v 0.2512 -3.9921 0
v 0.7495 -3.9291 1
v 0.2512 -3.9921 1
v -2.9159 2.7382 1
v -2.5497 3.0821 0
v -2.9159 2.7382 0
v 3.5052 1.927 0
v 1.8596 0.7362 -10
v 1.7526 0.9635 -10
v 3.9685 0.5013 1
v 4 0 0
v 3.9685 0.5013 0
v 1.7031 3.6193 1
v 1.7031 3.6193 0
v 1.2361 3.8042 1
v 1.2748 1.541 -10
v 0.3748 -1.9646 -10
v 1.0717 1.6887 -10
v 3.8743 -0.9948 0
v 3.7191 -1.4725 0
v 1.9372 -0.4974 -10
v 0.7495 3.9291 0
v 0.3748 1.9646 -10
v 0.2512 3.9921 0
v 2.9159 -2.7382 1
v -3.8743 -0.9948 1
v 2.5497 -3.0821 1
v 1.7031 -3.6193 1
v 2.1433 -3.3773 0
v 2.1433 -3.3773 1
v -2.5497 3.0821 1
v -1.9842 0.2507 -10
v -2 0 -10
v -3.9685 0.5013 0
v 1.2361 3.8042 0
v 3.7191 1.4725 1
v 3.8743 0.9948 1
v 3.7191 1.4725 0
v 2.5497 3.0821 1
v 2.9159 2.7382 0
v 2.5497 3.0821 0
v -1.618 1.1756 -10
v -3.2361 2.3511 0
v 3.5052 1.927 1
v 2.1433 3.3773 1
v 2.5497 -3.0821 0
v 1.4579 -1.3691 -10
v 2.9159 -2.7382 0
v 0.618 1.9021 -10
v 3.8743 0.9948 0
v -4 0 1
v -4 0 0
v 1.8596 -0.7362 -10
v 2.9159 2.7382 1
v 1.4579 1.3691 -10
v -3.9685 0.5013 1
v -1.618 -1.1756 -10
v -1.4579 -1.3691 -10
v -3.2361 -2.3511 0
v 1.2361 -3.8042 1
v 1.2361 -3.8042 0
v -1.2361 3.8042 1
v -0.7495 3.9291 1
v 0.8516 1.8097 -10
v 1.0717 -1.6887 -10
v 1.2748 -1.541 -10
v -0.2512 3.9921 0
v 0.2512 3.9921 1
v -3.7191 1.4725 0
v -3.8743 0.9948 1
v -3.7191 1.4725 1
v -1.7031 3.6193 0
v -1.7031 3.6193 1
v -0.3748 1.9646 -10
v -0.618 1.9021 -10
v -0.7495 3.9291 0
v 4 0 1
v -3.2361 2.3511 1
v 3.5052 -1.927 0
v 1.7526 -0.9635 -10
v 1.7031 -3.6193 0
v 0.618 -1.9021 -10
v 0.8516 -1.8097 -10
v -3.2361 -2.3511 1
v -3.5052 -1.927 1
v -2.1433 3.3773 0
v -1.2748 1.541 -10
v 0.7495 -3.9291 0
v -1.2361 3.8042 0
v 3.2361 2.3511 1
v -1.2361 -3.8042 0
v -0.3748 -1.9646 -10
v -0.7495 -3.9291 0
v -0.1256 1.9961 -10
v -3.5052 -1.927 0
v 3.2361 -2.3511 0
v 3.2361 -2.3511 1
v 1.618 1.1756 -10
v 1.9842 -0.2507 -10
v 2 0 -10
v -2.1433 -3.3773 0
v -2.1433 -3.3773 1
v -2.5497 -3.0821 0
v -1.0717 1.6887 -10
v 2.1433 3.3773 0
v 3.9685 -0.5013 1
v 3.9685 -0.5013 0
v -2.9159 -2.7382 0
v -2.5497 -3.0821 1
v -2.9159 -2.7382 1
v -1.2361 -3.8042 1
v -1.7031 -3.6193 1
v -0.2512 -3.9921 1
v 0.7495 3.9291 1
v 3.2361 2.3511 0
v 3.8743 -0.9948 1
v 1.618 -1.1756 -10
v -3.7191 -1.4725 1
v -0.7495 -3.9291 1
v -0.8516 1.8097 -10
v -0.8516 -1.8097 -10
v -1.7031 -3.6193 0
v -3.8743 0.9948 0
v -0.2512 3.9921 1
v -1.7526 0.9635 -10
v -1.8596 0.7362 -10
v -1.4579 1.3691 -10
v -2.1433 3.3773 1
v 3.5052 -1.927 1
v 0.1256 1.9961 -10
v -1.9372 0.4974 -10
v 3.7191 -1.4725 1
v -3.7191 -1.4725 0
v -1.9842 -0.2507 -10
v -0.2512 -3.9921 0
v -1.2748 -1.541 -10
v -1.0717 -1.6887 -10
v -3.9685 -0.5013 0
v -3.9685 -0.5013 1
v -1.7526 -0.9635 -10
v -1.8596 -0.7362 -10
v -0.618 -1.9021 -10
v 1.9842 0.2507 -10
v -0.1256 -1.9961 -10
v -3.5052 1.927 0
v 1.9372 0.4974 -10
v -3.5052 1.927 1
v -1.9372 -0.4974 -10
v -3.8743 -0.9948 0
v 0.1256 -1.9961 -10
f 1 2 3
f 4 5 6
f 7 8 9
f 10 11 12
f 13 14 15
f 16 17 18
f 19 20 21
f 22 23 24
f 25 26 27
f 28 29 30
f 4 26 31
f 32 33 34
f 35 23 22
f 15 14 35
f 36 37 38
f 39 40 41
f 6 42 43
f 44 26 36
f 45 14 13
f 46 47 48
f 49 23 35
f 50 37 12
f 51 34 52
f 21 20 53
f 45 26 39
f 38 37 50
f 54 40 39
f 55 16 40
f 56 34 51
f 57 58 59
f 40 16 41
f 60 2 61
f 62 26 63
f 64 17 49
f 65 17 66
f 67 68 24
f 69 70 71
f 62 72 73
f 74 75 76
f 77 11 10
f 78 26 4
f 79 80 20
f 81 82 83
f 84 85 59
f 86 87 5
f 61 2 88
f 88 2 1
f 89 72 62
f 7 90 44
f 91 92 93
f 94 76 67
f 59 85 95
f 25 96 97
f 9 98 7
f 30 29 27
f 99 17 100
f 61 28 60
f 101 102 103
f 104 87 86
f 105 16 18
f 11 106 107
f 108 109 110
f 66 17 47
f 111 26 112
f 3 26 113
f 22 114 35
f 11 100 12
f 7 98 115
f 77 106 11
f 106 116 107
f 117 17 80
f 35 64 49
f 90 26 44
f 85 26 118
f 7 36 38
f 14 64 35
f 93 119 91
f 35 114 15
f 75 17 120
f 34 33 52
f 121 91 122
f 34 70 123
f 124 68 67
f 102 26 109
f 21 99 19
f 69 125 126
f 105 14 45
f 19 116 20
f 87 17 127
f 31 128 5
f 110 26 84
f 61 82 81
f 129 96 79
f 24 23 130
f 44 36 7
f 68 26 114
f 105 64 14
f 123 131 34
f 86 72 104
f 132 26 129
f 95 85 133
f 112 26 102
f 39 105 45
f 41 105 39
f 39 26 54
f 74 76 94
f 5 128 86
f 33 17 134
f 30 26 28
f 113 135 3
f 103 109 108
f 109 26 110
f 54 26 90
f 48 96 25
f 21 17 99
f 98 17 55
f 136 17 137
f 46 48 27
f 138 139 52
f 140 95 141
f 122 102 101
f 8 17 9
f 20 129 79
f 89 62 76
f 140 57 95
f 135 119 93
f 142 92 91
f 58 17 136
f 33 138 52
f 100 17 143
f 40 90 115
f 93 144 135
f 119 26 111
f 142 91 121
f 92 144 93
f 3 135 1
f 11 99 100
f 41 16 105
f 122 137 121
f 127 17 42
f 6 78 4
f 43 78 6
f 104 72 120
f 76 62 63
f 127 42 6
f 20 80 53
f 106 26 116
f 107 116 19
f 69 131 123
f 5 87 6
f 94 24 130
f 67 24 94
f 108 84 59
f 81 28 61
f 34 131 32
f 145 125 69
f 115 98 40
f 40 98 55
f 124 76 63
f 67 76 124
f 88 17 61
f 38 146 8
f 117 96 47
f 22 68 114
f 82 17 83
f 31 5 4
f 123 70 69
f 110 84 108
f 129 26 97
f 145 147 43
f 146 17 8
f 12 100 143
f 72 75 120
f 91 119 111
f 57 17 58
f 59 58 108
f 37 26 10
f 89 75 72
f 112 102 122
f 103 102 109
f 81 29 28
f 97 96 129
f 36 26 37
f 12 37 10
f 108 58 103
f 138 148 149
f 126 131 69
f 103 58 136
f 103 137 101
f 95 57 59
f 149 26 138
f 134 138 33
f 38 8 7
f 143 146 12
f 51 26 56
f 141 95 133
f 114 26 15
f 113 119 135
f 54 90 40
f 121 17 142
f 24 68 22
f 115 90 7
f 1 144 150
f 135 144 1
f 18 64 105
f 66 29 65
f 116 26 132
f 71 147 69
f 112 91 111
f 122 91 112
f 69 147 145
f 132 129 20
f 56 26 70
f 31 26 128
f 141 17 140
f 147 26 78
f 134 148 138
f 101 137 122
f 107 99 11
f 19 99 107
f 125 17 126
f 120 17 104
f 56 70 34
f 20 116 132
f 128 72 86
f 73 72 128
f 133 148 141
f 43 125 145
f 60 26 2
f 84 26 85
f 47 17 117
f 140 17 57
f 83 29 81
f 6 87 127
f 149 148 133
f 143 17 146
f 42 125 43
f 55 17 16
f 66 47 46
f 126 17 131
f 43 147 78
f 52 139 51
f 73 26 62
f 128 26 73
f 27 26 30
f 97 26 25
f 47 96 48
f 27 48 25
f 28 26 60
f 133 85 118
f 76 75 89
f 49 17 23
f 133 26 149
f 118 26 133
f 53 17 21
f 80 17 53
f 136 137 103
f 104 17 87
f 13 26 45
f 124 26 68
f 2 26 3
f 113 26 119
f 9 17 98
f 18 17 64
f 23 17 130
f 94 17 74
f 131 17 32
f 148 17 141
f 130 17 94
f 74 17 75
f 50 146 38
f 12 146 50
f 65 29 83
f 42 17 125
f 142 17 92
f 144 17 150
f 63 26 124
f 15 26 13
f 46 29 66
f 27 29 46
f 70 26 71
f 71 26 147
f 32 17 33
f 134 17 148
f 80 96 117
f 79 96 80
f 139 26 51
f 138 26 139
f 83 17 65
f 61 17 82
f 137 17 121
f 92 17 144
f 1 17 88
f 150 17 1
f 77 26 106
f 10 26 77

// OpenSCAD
$fn = 50;
hull() {
	cylinder(r=4, h=1);
	translate([0, 0, -10]) {
		cylinder(r=2, h=1);
	}
}
